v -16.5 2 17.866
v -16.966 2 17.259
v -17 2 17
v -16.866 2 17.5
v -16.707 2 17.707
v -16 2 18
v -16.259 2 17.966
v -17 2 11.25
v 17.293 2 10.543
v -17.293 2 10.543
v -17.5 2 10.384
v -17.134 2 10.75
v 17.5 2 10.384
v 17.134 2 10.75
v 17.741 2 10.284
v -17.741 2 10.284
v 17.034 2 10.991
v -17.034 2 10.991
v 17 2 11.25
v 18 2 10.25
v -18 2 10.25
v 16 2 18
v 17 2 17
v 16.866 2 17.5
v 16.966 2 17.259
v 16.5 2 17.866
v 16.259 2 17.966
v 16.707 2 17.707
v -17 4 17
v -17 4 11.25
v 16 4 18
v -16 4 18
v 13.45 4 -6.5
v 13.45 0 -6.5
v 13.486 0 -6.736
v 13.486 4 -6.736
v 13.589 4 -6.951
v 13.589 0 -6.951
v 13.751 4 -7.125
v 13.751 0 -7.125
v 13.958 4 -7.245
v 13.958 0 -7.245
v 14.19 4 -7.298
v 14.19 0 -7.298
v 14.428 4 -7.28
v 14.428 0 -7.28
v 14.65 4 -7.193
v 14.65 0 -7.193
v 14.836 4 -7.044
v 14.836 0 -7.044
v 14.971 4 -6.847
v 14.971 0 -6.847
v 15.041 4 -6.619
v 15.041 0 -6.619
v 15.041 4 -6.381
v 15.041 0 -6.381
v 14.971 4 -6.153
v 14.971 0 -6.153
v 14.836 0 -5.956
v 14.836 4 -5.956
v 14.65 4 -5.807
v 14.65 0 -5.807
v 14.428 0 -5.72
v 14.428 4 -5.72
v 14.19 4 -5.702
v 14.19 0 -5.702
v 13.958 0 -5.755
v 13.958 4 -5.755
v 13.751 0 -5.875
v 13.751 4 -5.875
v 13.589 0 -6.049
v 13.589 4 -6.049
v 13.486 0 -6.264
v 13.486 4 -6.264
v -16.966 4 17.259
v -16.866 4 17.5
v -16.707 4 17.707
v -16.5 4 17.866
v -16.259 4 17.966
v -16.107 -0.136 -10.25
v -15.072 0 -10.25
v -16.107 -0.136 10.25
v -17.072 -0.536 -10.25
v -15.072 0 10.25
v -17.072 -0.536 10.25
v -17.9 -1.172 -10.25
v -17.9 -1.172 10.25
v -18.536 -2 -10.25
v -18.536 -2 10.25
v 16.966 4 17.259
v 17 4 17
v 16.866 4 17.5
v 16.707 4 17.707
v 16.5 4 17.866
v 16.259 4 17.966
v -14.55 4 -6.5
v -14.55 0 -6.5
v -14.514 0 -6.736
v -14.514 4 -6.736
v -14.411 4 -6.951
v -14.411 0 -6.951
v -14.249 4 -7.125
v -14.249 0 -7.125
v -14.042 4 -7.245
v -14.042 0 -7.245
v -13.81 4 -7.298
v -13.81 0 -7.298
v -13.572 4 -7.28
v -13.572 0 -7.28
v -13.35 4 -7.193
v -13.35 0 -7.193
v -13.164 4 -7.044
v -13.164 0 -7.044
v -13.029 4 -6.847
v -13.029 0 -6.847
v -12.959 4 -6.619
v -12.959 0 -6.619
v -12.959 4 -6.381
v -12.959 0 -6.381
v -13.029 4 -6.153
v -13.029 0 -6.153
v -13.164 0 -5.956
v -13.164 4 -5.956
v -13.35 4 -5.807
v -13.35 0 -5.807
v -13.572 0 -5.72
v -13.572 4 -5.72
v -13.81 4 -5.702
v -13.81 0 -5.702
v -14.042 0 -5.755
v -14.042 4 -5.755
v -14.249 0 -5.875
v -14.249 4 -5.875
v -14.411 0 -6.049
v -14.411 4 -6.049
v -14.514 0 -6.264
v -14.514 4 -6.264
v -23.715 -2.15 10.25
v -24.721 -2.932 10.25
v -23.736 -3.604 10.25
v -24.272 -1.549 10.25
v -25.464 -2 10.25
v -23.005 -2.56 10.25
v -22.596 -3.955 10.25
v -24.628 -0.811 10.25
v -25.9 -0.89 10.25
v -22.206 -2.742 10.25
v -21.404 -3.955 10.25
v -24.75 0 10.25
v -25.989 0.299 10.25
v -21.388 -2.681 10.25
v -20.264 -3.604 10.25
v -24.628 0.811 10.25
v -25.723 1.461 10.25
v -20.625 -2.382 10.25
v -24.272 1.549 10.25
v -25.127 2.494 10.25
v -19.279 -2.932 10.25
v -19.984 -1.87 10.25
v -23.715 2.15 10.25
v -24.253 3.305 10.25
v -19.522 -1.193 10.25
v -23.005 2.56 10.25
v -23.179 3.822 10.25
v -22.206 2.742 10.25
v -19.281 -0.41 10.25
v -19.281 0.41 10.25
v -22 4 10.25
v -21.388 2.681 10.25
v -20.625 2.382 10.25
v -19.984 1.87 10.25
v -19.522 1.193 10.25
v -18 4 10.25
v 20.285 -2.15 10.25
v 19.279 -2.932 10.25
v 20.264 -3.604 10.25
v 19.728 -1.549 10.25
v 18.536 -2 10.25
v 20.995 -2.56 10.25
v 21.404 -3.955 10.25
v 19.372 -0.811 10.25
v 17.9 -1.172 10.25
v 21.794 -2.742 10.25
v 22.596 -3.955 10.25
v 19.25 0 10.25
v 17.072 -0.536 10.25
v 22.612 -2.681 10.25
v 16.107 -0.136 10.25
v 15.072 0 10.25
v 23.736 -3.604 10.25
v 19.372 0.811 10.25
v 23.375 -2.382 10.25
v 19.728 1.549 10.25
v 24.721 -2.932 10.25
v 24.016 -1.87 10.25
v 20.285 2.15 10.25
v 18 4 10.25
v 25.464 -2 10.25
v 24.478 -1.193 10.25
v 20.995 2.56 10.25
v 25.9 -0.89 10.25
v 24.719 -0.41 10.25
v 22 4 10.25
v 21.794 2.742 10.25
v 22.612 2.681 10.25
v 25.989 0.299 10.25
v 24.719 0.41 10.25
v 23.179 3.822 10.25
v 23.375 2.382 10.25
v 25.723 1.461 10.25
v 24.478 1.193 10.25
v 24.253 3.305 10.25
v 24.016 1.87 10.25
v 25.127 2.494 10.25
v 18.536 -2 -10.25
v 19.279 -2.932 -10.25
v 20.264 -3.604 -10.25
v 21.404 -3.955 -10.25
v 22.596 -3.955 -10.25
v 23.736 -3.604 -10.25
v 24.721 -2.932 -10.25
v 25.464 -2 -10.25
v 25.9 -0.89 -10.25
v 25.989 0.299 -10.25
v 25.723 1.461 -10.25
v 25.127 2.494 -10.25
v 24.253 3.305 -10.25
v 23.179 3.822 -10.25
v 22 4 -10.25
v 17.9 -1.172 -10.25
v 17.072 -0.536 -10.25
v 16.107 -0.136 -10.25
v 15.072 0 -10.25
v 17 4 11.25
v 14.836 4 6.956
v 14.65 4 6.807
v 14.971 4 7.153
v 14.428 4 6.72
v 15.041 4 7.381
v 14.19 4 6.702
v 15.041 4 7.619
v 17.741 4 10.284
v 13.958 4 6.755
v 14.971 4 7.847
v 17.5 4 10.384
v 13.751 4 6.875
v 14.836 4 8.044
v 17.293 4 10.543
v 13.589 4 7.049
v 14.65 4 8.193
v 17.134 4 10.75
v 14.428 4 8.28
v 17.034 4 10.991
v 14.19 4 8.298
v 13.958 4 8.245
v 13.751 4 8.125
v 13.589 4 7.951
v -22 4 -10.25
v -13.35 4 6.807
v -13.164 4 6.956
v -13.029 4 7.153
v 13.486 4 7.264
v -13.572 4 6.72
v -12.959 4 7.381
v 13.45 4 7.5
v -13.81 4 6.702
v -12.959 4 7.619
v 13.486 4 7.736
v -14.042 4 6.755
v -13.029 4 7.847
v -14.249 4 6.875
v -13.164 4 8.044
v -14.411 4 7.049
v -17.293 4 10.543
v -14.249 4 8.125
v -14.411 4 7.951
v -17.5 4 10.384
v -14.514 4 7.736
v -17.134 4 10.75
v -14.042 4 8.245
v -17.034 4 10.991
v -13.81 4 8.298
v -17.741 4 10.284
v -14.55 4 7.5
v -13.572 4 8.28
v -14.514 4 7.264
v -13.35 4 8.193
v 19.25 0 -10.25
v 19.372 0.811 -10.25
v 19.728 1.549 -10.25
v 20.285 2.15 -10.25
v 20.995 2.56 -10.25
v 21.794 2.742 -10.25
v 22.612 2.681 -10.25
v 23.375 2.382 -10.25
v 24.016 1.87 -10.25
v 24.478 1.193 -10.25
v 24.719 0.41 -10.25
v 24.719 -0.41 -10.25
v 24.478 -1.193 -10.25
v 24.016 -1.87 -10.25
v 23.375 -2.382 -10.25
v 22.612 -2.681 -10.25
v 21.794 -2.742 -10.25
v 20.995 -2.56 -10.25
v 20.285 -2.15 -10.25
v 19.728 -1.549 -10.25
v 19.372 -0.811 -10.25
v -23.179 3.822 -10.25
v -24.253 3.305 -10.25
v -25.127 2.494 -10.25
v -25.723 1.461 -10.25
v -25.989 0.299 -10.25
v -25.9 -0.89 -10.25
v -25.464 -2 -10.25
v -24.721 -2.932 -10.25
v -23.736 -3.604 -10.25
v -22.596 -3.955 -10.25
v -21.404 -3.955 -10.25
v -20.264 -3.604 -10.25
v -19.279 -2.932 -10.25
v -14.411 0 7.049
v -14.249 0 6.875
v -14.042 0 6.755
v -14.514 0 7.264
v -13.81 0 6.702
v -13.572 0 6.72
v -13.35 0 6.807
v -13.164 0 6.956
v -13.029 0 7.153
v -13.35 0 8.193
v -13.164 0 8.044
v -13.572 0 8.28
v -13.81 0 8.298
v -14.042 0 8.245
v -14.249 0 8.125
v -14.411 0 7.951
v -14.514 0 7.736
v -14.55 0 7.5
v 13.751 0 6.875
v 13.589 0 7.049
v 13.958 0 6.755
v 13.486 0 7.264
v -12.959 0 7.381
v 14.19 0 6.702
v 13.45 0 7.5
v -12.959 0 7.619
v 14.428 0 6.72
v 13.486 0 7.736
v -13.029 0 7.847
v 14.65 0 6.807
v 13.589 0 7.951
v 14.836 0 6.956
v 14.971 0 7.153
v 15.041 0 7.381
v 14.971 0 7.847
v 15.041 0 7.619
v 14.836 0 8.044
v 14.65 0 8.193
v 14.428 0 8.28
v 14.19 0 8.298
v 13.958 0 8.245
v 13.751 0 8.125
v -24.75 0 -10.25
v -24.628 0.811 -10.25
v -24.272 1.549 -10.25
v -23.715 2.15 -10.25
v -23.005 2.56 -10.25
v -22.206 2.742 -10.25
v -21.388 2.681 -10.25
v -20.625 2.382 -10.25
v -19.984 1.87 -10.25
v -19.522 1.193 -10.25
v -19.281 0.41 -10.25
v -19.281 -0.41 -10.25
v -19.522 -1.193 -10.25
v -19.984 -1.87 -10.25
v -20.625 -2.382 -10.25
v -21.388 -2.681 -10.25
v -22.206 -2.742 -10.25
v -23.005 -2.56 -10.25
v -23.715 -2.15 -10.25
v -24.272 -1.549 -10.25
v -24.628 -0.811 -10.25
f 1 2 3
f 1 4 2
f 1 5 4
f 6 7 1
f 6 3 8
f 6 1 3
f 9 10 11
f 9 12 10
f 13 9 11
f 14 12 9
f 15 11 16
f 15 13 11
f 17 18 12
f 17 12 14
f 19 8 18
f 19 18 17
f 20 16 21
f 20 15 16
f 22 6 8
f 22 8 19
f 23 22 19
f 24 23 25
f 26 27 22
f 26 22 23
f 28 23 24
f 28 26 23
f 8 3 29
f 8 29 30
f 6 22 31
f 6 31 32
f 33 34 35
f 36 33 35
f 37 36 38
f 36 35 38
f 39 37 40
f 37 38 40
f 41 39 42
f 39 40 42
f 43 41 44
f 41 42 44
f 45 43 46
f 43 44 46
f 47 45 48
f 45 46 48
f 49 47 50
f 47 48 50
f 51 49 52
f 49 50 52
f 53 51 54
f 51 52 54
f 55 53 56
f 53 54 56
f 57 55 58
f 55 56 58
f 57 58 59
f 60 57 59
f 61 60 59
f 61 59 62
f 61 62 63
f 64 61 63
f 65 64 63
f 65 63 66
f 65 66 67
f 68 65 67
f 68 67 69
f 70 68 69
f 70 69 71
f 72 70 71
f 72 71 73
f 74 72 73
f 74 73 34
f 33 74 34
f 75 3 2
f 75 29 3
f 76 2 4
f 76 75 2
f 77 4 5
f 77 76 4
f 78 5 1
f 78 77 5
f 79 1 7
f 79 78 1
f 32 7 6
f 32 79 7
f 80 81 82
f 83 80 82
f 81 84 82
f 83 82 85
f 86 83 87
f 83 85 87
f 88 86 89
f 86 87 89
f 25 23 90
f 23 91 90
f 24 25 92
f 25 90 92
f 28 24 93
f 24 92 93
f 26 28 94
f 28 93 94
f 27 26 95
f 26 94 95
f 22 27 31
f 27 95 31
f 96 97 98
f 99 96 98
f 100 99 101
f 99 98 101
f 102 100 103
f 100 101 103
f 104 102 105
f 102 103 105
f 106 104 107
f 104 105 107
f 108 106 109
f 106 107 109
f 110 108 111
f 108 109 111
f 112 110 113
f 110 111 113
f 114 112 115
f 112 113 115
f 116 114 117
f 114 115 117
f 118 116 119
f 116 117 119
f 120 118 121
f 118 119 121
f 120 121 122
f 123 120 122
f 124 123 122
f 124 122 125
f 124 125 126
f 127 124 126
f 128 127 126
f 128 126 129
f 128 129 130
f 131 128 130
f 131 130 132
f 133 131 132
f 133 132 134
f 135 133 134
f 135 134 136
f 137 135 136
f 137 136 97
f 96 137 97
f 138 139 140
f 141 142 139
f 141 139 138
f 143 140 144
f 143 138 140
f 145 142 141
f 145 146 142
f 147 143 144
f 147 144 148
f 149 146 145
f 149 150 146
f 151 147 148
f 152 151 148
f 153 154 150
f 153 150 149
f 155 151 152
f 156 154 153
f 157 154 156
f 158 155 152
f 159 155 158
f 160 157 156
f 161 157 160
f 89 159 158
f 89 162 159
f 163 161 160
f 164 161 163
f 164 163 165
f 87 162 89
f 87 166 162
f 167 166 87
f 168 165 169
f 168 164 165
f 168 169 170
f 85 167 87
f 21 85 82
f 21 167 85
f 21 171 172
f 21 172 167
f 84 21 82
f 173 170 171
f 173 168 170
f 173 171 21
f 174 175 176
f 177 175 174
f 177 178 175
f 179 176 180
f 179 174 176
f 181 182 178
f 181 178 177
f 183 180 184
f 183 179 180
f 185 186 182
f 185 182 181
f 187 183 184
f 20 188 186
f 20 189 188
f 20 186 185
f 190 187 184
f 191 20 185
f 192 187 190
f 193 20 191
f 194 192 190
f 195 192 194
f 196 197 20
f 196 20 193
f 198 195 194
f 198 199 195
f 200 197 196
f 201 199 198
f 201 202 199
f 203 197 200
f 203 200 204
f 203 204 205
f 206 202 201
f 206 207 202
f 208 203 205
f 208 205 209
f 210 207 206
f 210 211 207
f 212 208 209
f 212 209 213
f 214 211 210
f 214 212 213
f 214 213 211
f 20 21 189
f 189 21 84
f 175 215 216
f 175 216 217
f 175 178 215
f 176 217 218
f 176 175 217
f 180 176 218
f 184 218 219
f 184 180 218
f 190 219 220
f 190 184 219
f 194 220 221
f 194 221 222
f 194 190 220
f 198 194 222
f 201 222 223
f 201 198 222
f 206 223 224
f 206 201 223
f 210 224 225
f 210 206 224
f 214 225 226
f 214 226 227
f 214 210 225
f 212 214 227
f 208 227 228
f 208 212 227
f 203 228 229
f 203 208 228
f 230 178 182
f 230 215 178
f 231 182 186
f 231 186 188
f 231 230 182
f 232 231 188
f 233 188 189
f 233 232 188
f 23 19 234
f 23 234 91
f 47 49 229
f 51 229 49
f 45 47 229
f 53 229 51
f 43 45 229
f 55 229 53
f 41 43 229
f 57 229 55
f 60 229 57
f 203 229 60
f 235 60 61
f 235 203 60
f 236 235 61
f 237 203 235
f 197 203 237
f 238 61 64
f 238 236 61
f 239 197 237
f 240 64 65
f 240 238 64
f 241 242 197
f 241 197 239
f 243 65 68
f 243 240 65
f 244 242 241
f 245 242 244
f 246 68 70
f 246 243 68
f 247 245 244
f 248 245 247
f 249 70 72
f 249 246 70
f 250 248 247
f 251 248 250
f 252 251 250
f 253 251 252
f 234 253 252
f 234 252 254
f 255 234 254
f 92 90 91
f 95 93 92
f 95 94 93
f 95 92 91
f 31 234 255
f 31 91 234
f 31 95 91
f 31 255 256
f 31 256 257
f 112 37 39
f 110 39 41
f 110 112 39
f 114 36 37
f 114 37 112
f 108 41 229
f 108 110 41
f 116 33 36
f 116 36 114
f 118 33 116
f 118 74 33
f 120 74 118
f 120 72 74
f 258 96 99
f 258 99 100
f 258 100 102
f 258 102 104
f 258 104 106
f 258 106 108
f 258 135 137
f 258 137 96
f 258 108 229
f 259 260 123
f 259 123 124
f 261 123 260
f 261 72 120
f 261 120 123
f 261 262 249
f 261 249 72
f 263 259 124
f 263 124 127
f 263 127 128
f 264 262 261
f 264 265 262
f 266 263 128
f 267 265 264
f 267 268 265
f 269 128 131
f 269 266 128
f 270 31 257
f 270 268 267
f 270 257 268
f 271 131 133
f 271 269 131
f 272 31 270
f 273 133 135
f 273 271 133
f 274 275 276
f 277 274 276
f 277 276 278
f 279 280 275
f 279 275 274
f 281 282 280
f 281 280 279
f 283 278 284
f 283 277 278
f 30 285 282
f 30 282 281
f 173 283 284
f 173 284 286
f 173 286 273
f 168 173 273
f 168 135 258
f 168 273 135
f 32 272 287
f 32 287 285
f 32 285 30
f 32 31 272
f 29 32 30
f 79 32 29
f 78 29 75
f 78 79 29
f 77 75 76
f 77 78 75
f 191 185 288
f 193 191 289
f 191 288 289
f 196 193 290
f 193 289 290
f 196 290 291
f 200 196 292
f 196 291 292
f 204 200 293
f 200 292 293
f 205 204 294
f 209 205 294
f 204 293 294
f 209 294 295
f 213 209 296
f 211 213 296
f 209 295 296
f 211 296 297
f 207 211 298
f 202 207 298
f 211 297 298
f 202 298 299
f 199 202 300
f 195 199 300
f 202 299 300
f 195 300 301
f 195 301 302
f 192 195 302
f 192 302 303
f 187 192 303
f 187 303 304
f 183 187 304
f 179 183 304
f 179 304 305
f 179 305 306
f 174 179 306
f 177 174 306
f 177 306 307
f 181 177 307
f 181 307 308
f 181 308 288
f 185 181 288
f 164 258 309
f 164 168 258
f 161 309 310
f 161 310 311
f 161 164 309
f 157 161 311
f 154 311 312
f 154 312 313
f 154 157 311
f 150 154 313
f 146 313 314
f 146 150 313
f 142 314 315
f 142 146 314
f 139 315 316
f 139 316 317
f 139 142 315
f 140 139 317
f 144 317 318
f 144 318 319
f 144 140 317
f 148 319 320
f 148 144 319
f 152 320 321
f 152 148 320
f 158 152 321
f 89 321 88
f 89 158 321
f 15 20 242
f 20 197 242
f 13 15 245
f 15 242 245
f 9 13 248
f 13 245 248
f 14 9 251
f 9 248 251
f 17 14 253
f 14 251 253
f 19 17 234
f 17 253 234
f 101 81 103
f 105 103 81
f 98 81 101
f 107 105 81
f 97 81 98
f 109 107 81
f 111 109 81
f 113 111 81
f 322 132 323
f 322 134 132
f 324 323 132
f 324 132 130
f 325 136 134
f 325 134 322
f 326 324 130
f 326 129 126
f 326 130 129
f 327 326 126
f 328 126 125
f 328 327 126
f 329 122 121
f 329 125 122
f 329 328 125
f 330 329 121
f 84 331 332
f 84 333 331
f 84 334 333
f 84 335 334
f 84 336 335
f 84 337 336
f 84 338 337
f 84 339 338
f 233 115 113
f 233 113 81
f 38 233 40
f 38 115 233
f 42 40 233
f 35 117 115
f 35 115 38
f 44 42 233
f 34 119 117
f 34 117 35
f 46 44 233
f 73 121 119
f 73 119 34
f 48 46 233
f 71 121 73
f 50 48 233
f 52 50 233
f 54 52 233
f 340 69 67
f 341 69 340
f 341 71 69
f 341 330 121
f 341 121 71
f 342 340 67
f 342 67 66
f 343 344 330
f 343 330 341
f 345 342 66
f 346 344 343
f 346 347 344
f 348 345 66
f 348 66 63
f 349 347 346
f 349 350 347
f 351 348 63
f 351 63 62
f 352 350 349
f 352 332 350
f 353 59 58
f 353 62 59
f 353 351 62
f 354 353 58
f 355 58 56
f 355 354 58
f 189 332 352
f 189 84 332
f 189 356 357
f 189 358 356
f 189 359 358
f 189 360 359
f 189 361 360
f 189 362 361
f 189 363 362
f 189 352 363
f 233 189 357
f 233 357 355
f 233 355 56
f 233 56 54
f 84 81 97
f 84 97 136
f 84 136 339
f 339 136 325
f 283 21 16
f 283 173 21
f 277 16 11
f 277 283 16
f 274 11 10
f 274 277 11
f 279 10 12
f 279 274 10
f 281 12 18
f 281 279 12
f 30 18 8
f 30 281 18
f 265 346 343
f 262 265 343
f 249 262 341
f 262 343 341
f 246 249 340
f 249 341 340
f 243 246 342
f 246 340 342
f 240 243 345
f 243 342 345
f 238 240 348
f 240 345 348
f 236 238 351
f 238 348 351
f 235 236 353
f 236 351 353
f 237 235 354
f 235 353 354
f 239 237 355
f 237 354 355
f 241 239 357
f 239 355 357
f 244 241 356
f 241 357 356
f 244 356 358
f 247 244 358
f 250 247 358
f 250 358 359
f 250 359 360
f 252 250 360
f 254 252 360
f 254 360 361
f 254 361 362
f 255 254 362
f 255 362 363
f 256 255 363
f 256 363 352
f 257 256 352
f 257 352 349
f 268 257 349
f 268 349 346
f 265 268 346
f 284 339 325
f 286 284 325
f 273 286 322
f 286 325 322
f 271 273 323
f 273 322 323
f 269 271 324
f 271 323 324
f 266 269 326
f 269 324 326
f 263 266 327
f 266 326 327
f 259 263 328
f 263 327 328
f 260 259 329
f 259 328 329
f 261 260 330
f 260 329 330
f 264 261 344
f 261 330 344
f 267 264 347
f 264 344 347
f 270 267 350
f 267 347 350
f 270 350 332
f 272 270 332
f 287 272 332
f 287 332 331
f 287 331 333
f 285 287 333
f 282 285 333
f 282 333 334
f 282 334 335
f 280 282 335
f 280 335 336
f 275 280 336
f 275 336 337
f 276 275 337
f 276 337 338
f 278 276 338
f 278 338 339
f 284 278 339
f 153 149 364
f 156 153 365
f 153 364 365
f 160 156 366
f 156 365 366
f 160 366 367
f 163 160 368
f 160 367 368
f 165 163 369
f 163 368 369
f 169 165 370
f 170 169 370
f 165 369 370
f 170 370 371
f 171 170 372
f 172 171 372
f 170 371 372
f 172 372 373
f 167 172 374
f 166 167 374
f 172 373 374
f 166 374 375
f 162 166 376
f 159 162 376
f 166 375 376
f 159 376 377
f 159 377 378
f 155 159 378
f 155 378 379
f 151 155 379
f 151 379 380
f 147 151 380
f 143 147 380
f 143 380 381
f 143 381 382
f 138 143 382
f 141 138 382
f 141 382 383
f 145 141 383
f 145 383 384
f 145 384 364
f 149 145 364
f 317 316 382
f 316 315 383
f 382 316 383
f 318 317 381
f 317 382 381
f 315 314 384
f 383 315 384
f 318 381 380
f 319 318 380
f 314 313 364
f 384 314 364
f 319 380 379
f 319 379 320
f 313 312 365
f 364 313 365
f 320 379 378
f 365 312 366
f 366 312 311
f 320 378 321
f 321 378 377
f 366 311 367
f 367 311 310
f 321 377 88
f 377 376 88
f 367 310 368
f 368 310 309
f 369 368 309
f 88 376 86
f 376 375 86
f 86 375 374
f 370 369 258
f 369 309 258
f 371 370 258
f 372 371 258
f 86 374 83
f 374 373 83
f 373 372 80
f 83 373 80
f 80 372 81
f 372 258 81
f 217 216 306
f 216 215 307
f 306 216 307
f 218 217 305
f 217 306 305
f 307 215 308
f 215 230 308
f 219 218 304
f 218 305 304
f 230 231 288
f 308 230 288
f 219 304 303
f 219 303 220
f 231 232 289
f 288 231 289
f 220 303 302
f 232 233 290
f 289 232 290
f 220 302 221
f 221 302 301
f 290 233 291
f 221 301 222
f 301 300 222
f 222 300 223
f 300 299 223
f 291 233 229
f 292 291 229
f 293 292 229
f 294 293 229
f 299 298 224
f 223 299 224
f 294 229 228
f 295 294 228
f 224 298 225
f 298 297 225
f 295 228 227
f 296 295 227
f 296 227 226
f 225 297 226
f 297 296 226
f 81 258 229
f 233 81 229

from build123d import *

# Parameters (mm, degrees)
BOSS_EXTRUDE1_DEPTH   = 10.25
FILLET1_R             = 4
BOSS_EXTRUDE2_DEPTH   = 2
M5_CLEARANCE_HOLE1_D  = 5.5
M2X0_4_TAPPED_HOLE1_D = 1.6
FILLET2_R             = 1


with BuildPart() as part:
    # Sketch1 → Boss-Extrude1 (new, symmetric)
    with BuildSketch(Plane.XY):
        with BuildLine():
            Line((22, 4), (-22, 4))
            ThreePointArc((-22, 4), (-24.828427125, -2.828427125), (-18, 0))
            Line((-18, 0), (18, 0))
            ThreePointArc((18, 0), (24.828427125, -2.828427125), (22, 4))
        make_face()
    extrude(amount=BOSS_EXTRUDE1_DEPTH, both=True)

    # Fillet1
    fillet1_edges = [part.edges().sort_by_distance(p)[0] for p in [
        (18, 0, 0),
        (-18, 0, 0),
    ]]
    fillet(fillet1_edges, radius=FILLET1_R)

    # Sketch7 → Boss-Extrude2 (add)
    with BuildSketch(Plane.XZ.offset(-2)):
        Polygon((17, 10.25), (17, 18), (-17, 18), (-17, 10.25), (-15.07179677, 10.25), (15.07179677, 10.25), align=None)
    extrude(amount=-BOSS_EXTRUDE2_DEPTH)

    # M5 Clearance Hole1 (through all)
    with Locations(Plane.XY.offset(10.25)):
        with Locations((-22, 0), (22, 0)):
            Hole(M5_CLEARANCE_HOLE1_D / 2)

    # M2x0.4 Tapped Hole1 (through all)
    with Locations(Plane(origin=(0, 4, 0), x_dir=(1, 0, 0), z_dir=(0, 1, 0))):
        with Locations((14.25, 6.500000018), (14.25, -7.499999982), (-13.75, -7.499999982), (-13.75, 6.500000018)):
            Hole(M2X0_4_TAPPED_HOLE1_D / 2)

    # Fillet2
    fillet2_edges = [part.edges().sort_by_distance(p)[0] for p in [
        (17, 3, 18),
        (17, 3, 10.25),
        (-17, 3, 10.25),
        (-17, 3, 18),
    ]]
    fillet(fillet2_edges, radius=FILLET2_R)


solid = part.part
